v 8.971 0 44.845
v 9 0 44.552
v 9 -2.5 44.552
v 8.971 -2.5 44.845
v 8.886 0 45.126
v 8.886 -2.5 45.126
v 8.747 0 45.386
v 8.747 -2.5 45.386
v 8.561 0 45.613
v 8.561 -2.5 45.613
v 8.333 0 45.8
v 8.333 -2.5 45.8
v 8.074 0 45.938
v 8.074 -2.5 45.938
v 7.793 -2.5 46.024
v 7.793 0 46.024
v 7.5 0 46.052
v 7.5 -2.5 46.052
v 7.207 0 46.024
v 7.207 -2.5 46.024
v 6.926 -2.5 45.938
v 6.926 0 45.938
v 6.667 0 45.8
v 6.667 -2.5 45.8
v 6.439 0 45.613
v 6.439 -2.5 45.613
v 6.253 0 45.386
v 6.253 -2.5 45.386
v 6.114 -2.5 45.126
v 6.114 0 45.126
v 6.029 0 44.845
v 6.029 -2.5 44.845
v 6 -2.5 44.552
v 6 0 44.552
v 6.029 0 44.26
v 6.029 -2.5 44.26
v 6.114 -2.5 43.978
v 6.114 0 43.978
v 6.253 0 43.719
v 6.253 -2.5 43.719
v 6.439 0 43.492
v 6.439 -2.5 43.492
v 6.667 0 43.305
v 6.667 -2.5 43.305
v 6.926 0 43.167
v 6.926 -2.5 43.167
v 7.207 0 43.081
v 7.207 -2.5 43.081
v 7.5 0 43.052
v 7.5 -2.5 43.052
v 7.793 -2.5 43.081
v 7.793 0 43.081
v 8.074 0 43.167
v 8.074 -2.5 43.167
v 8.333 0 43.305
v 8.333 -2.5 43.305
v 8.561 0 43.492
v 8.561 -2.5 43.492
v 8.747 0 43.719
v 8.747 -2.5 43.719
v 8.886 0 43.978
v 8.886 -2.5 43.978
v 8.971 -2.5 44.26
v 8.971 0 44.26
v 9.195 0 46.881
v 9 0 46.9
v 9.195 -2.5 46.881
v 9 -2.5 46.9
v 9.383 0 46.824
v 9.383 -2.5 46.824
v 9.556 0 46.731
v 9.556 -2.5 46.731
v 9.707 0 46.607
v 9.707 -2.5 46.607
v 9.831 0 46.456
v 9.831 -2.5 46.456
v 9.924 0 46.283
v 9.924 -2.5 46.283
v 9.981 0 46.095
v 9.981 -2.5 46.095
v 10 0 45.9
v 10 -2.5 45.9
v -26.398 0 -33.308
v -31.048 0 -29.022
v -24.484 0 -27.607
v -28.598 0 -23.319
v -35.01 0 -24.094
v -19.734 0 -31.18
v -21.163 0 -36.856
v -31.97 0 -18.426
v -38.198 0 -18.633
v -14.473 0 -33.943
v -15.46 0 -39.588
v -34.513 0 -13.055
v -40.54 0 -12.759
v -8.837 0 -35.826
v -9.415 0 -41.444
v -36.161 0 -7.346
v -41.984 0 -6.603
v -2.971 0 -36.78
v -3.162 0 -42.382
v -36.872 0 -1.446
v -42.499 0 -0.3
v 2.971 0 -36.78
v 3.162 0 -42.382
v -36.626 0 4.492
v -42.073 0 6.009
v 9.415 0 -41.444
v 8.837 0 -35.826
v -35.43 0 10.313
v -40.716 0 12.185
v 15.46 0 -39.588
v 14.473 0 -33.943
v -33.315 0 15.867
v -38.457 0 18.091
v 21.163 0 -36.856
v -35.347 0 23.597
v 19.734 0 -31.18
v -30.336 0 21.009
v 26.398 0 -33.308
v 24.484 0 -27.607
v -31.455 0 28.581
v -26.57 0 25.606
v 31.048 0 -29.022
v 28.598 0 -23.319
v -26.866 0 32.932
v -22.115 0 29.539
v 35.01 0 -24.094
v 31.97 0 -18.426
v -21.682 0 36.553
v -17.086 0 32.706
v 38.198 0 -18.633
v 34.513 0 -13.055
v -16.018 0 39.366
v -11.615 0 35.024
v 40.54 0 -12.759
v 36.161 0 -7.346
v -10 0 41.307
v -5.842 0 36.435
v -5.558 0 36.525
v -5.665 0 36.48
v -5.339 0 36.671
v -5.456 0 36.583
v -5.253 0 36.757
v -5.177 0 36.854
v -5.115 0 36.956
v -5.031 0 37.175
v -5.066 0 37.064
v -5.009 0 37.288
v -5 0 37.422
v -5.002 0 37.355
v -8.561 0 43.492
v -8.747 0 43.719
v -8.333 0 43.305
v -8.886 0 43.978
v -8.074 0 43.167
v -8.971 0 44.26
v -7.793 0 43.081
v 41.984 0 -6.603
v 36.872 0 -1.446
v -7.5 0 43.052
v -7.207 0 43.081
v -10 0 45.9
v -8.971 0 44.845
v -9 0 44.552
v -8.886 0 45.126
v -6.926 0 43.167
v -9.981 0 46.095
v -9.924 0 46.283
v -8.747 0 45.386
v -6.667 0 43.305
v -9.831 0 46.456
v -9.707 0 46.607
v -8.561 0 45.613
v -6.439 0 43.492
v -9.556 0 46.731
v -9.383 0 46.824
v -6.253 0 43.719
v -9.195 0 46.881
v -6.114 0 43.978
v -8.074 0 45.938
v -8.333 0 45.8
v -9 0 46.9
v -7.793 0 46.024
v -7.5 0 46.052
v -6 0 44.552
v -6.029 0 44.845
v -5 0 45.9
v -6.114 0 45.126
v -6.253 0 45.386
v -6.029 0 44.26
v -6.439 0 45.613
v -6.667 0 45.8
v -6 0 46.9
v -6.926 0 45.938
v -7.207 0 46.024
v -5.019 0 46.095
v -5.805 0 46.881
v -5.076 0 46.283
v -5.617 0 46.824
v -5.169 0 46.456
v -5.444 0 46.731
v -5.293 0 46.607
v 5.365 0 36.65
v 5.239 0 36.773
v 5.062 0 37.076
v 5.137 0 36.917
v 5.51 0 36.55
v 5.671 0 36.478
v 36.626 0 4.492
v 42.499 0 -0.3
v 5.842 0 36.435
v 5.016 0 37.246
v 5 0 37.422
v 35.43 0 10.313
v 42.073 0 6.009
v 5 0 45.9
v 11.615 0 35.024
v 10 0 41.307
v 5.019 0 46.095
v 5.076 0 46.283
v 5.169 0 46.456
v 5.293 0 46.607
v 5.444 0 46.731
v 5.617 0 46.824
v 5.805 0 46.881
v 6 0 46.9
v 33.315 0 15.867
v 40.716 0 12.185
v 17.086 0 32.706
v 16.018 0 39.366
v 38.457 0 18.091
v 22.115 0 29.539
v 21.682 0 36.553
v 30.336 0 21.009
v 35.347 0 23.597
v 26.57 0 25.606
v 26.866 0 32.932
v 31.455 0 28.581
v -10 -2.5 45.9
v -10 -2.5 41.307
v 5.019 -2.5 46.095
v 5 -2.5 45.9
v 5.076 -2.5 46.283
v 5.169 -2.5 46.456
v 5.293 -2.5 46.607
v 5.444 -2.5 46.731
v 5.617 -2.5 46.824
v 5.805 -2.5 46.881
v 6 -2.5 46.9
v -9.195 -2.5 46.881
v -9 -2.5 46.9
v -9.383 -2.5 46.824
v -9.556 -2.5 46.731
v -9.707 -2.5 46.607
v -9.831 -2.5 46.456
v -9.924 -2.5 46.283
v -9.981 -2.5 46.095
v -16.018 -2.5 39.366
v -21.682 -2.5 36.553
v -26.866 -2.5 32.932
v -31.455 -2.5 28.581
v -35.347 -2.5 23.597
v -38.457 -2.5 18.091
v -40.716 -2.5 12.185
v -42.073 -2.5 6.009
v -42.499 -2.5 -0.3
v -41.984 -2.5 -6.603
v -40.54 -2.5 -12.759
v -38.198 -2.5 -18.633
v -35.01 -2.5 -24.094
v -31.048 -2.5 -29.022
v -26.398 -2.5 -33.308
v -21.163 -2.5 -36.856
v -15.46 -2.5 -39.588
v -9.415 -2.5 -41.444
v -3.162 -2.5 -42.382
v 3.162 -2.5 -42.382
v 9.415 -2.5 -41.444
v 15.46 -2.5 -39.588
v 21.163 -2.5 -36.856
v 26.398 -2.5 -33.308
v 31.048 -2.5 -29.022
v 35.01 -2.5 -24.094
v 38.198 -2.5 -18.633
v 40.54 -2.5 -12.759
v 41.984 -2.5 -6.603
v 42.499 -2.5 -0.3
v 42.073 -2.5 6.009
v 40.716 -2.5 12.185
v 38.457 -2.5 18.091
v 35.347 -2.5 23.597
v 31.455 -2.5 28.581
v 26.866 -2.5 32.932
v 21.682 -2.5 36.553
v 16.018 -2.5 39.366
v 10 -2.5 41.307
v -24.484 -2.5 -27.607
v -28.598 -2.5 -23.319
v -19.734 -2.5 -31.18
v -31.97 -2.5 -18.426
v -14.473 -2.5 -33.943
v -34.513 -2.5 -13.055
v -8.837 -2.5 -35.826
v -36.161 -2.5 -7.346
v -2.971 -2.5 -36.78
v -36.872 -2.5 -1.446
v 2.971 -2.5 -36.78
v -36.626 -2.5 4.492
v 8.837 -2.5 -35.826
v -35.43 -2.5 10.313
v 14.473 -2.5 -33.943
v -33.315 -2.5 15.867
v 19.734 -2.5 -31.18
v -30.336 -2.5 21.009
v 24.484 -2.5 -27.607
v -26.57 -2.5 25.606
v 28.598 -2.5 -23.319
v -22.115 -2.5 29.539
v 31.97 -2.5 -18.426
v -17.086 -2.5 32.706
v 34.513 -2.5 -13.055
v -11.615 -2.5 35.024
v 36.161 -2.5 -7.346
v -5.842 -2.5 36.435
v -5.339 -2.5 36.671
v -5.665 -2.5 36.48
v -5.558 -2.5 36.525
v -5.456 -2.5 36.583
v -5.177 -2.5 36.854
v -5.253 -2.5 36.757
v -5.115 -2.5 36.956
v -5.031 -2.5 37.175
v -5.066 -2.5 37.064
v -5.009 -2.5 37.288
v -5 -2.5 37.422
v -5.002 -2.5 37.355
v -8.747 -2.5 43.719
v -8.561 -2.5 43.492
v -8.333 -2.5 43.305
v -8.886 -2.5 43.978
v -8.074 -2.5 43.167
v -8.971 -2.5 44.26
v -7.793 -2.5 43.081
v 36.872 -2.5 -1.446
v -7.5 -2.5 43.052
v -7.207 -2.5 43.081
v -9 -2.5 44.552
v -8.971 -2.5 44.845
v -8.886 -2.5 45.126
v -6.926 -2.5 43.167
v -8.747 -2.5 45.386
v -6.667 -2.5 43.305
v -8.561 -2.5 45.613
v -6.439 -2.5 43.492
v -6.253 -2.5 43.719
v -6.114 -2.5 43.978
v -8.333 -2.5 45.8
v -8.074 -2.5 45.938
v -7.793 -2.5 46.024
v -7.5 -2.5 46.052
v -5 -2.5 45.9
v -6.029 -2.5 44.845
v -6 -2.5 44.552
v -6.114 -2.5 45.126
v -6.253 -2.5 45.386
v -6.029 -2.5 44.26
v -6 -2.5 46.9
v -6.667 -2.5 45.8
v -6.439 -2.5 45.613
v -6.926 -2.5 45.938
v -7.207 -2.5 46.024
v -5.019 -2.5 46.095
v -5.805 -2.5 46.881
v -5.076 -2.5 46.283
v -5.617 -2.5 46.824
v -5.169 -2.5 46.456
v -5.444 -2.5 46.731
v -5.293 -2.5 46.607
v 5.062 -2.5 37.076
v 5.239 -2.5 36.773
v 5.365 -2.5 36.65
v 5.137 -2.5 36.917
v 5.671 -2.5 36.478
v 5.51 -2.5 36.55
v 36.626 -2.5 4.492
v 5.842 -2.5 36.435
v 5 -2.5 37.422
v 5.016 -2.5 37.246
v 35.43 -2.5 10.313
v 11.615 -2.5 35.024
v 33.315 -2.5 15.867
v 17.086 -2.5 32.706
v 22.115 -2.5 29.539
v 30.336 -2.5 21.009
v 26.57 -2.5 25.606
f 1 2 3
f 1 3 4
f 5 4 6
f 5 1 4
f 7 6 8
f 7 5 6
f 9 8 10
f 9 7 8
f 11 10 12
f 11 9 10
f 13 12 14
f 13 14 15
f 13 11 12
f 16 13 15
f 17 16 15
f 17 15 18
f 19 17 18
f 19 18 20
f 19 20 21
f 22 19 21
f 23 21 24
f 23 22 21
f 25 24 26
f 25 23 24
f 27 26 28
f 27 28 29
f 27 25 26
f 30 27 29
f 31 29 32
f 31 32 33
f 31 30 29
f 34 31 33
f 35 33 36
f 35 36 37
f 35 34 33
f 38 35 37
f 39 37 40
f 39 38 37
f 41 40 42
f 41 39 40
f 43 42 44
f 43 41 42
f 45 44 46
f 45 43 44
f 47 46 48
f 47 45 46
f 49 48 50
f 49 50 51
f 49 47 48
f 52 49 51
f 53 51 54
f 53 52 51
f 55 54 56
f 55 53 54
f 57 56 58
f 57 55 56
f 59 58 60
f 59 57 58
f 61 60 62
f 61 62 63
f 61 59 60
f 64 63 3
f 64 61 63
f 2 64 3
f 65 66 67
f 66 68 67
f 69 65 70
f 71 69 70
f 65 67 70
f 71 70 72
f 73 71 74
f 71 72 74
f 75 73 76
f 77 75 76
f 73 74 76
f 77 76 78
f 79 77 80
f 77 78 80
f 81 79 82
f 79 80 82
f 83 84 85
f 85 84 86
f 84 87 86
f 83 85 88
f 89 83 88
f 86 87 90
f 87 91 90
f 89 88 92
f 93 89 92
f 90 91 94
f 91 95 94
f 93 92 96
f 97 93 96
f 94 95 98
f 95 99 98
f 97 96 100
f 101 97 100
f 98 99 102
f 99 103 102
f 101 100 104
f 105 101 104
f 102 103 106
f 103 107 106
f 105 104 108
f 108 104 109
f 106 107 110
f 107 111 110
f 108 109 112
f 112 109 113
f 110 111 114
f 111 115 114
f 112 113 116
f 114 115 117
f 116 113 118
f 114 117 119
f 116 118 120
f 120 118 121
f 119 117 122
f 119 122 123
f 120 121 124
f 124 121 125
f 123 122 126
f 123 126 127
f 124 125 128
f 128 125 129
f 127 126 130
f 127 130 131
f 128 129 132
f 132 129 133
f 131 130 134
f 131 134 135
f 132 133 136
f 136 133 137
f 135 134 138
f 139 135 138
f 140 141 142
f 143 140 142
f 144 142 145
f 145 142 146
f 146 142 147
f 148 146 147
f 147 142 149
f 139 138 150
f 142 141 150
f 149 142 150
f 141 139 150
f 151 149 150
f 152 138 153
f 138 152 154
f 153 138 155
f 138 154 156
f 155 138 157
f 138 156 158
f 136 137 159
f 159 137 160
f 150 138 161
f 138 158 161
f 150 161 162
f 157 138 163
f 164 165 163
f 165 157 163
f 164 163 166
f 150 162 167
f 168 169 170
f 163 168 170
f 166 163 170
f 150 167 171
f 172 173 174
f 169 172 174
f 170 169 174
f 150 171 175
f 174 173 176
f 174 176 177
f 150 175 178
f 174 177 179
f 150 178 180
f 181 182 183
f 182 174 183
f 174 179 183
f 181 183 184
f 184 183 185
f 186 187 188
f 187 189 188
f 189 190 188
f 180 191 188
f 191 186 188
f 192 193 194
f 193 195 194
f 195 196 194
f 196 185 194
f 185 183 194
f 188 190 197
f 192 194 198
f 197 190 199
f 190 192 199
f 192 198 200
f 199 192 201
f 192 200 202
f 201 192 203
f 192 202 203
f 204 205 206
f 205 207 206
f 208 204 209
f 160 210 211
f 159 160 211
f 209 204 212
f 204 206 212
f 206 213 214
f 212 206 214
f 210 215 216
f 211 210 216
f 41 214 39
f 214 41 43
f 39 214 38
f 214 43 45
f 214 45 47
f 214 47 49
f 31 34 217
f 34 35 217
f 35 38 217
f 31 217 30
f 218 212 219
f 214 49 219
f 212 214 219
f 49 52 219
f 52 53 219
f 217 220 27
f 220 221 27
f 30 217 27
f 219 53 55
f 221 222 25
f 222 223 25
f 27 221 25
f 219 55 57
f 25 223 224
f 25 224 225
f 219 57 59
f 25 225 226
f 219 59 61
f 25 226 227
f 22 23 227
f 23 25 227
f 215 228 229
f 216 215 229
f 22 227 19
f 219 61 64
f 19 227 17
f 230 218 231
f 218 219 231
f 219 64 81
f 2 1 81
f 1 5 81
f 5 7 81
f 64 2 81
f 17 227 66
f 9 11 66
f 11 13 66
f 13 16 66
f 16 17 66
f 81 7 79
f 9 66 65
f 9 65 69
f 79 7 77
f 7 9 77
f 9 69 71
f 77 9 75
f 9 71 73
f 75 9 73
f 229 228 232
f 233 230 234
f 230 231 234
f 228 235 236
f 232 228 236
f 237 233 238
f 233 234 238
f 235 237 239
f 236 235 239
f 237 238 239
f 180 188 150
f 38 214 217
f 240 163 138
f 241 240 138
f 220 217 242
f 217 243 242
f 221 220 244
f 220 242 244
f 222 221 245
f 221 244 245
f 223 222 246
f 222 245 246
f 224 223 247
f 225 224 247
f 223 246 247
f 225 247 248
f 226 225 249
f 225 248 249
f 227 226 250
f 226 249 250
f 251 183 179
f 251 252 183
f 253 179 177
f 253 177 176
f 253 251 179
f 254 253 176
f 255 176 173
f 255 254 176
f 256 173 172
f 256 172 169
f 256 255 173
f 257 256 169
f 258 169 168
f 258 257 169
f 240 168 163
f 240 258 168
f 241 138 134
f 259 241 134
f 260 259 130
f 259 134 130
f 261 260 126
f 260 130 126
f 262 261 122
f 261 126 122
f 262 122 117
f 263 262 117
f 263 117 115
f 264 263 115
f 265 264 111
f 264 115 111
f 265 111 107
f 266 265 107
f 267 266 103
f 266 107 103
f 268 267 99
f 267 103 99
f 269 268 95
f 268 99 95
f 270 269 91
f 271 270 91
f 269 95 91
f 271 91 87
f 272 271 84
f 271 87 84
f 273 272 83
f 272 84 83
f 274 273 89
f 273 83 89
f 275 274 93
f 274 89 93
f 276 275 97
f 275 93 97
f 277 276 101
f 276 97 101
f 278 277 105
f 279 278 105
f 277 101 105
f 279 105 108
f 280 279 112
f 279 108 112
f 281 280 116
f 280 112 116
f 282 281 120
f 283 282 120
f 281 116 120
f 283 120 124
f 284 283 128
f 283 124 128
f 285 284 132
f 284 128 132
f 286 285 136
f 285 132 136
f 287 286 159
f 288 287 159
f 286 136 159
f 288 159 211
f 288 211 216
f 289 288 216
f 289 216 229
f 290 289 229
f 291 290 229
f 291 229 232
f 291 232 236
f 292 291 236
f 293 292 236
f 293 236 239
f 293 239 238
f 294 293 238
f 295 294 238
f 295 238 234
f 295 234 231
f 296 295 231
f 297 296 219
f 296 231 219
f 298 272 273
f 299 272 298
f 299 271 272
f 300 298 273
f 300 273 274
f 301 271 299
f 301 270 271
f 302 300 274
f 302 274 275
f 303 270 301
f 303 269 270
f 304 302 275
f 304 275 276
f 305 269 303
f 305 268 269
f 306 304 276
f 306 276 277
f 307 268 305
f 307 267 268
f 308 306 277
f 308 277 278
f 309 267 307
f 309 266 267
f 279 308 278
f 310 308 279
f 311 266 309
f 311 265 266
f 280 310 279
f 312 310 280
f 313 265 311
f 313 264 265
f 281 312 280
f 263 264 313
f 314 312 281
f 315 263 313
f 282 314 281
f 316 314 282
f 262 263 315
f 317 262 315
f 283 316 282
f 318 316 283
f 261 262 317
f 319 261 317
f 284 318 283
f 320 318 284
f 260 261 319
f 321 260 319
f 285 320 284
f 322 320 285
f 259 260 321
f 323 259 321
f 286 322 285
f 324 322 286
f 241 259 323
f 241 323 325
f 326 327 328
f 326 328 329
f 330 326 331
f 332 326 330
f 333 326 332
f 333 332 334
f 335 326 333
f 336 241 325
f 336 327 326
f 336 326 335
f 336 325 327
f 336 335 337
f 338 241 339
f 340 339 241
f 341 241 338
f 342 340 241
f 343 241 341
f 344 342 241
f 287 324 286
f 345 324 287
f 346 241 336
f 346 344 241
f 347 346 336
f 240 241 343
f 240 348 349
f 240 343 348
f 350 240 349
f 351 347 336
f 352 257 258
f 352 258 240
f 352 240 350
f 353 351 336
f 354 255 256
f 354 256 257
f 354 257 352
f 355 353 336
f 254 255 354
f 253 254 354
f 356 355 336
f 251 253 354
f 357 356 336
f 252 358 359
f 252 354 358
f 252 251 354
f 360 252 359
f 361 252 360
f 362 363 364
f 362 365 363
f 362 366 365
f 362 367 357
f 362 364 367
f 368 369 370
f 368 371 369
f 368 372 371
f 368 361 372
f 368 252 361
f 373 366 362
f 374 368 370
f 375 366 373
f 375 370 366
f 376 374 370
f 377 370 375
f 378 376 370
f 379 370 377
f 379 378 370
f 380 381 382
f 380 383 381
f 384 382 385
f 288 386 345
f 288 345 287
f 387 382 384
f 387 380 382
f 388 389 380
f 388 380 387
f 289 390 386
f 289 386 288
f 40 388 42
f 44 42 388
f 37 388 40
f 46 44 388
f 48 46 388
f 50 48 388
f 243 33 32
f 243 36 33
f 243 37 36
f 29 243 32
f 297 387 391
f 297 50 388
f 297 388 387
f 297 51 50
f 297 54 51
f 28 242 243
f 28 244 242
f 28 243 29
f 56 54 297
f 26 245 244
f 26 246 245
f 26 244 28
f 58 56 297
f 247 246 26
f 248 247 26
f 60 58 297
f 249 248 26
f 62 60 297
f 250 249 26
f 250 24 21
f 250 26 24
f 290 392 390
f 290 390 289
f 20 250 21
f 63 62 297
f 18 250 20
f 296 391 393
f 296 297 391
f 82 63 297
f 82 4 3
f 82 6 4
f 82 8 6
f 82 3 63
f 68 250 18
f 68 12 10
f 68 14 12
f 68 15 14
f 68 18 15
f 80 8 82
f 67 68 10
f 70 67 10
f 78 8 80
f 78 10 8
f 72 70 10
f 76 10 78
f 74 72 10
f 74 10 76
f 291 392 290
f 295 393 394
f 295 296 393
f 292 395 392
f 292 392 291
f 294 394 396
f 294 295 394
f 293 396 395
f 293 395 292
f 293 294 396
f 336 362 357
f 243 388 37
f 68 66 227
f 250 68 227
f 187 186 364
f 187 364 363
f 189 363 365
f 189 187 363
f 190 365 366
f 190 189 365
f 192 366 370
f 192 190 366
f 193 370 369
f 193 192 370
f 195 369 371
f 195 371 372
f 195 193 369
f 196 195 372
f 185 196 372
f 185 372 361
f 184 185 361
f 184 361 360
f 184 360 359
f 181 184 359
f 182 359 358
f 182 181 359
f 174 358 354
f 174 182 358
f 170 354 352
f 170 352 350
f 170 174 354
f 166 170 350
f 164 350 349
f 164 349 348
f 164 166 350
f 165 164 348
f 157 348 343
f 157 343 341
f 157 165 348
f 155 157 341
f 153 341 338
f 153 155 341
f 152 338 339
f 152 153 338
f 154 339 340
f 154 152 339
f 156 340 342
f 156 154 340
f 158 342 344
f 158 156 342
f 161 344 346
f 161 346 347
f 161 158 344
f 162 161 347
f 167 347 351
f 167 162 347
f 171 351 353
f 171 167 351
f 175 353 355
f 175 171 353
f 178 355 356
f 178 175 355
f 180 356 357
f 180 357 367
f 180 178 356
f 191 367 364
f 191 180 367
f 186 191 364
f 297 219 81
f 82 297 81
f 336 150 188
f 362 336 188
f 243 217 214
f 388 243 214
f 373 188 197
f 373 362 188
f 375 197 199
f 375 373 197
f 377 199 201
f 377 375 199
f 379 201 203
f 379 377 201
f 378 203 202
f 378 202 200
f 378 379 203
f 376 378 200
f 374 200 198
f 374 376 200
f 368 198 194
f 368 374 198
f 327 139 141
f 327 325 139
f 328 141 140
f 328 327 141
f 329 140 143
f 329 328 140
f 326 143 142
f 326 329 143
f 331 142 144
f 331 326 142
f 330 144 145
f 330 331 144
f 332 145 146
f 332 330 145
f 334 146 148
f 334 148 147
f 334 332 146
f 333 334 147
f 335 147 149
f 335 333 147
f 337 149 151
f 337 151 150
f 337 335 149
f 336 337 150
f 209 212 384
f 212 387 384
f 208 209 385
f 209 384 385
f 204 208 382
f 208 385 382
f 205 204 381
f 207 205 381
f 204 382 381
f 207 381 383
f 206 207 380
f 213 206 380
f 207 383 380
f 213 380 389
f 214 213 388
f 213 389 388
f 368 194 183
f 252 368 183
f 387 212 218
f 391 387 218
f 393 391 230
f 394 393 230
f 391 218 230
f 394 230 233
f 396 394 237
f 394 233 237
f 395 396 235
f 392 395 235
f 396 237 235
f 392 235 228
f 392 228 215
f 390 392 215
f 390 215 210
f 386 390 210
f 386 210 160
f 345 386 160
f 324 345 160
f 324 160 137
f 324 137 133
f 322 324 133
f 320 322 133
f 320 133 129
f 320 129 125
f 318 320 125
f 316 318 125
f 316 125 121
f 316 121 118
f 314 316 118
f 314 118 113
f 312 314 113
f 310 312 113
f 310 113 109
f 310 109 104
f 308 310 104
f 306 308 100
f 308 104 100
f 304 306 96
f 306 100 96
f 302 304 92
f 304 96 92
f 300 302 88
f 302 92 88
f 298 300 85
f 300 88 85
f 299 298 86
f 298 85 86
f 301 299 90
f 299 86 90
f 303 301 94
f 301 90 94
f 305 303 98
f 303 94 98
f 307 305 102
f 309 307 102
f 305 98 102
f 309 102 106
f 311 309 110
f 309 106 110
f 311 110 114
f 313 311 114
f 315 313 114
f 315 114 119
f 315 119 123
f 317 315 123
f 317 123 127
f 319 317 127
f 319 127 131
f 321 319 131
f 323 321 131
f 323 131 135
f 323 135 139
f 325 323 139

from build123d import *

# Parameters (mm, degrees)
F0_R     = 1.5
F1_DEPTH = 2.5
F2_R     = 1


with BuildPart() as f1:
    # F0 (on Front) → F1 (new body)
    with BuildSketch(Plane.XZ):
        with BuildLine():
            ThreePointArc((5, 36.559677), (-0.000826, -36.9), (-4.998364, 36.559901))
            Line((-4.998364, 36.559901), (-5, 36.9))
            Line((-5, 36.9), (-5, 42.204858))
            Line((-5, 42.204858), (-5, 46.9))
            Line((-5, 46.9), (-7.5, 46.9))
            Line((-7.5, 46.9), (-10, 46.9))
            Line((-10, 46.9), (-10, 41.306779))
            ThreePointArc((-10, 41.306779), (0, -42.5), (10, 41.306779))
            Line((10, 41.306779), (10, 46.9))
            Line((10, 46.9), (7.5, 46.9))
            Line((7.5, 46.9), (5, 46.9))
            Line((5, 46.9), (5, 42.204858))
            Line((5, 42.204858), (5, 36.9))
            Line((5, 36.9), (5, 36.559677))
        make_face()
        with Locations((-7.5, 44.552429)):
            Circle(F0_R, mode=Mode.SUBTRACT)
        with Locations((7.5, 44.552429)):
            Circle(F0_R, mode=Mode.SUBTRACT)
    extrude(amount=F1_DEPTH)

    # F2
    f2_edges = [f1.edges().sort_by_distance(p)[0] for p in [
        (-10, -1.25, 46.9),
        (-5, -1.25, 46.9),
        (5, -1.25, 46.9),
        (10, -1.25, 46.9),
        (5, -1.25, 36.559677),
        (-4.998364, -1.25, 36.559901),
    ]]
    fillet(f2_edges, radius=F2_R)


solid = f1.part
